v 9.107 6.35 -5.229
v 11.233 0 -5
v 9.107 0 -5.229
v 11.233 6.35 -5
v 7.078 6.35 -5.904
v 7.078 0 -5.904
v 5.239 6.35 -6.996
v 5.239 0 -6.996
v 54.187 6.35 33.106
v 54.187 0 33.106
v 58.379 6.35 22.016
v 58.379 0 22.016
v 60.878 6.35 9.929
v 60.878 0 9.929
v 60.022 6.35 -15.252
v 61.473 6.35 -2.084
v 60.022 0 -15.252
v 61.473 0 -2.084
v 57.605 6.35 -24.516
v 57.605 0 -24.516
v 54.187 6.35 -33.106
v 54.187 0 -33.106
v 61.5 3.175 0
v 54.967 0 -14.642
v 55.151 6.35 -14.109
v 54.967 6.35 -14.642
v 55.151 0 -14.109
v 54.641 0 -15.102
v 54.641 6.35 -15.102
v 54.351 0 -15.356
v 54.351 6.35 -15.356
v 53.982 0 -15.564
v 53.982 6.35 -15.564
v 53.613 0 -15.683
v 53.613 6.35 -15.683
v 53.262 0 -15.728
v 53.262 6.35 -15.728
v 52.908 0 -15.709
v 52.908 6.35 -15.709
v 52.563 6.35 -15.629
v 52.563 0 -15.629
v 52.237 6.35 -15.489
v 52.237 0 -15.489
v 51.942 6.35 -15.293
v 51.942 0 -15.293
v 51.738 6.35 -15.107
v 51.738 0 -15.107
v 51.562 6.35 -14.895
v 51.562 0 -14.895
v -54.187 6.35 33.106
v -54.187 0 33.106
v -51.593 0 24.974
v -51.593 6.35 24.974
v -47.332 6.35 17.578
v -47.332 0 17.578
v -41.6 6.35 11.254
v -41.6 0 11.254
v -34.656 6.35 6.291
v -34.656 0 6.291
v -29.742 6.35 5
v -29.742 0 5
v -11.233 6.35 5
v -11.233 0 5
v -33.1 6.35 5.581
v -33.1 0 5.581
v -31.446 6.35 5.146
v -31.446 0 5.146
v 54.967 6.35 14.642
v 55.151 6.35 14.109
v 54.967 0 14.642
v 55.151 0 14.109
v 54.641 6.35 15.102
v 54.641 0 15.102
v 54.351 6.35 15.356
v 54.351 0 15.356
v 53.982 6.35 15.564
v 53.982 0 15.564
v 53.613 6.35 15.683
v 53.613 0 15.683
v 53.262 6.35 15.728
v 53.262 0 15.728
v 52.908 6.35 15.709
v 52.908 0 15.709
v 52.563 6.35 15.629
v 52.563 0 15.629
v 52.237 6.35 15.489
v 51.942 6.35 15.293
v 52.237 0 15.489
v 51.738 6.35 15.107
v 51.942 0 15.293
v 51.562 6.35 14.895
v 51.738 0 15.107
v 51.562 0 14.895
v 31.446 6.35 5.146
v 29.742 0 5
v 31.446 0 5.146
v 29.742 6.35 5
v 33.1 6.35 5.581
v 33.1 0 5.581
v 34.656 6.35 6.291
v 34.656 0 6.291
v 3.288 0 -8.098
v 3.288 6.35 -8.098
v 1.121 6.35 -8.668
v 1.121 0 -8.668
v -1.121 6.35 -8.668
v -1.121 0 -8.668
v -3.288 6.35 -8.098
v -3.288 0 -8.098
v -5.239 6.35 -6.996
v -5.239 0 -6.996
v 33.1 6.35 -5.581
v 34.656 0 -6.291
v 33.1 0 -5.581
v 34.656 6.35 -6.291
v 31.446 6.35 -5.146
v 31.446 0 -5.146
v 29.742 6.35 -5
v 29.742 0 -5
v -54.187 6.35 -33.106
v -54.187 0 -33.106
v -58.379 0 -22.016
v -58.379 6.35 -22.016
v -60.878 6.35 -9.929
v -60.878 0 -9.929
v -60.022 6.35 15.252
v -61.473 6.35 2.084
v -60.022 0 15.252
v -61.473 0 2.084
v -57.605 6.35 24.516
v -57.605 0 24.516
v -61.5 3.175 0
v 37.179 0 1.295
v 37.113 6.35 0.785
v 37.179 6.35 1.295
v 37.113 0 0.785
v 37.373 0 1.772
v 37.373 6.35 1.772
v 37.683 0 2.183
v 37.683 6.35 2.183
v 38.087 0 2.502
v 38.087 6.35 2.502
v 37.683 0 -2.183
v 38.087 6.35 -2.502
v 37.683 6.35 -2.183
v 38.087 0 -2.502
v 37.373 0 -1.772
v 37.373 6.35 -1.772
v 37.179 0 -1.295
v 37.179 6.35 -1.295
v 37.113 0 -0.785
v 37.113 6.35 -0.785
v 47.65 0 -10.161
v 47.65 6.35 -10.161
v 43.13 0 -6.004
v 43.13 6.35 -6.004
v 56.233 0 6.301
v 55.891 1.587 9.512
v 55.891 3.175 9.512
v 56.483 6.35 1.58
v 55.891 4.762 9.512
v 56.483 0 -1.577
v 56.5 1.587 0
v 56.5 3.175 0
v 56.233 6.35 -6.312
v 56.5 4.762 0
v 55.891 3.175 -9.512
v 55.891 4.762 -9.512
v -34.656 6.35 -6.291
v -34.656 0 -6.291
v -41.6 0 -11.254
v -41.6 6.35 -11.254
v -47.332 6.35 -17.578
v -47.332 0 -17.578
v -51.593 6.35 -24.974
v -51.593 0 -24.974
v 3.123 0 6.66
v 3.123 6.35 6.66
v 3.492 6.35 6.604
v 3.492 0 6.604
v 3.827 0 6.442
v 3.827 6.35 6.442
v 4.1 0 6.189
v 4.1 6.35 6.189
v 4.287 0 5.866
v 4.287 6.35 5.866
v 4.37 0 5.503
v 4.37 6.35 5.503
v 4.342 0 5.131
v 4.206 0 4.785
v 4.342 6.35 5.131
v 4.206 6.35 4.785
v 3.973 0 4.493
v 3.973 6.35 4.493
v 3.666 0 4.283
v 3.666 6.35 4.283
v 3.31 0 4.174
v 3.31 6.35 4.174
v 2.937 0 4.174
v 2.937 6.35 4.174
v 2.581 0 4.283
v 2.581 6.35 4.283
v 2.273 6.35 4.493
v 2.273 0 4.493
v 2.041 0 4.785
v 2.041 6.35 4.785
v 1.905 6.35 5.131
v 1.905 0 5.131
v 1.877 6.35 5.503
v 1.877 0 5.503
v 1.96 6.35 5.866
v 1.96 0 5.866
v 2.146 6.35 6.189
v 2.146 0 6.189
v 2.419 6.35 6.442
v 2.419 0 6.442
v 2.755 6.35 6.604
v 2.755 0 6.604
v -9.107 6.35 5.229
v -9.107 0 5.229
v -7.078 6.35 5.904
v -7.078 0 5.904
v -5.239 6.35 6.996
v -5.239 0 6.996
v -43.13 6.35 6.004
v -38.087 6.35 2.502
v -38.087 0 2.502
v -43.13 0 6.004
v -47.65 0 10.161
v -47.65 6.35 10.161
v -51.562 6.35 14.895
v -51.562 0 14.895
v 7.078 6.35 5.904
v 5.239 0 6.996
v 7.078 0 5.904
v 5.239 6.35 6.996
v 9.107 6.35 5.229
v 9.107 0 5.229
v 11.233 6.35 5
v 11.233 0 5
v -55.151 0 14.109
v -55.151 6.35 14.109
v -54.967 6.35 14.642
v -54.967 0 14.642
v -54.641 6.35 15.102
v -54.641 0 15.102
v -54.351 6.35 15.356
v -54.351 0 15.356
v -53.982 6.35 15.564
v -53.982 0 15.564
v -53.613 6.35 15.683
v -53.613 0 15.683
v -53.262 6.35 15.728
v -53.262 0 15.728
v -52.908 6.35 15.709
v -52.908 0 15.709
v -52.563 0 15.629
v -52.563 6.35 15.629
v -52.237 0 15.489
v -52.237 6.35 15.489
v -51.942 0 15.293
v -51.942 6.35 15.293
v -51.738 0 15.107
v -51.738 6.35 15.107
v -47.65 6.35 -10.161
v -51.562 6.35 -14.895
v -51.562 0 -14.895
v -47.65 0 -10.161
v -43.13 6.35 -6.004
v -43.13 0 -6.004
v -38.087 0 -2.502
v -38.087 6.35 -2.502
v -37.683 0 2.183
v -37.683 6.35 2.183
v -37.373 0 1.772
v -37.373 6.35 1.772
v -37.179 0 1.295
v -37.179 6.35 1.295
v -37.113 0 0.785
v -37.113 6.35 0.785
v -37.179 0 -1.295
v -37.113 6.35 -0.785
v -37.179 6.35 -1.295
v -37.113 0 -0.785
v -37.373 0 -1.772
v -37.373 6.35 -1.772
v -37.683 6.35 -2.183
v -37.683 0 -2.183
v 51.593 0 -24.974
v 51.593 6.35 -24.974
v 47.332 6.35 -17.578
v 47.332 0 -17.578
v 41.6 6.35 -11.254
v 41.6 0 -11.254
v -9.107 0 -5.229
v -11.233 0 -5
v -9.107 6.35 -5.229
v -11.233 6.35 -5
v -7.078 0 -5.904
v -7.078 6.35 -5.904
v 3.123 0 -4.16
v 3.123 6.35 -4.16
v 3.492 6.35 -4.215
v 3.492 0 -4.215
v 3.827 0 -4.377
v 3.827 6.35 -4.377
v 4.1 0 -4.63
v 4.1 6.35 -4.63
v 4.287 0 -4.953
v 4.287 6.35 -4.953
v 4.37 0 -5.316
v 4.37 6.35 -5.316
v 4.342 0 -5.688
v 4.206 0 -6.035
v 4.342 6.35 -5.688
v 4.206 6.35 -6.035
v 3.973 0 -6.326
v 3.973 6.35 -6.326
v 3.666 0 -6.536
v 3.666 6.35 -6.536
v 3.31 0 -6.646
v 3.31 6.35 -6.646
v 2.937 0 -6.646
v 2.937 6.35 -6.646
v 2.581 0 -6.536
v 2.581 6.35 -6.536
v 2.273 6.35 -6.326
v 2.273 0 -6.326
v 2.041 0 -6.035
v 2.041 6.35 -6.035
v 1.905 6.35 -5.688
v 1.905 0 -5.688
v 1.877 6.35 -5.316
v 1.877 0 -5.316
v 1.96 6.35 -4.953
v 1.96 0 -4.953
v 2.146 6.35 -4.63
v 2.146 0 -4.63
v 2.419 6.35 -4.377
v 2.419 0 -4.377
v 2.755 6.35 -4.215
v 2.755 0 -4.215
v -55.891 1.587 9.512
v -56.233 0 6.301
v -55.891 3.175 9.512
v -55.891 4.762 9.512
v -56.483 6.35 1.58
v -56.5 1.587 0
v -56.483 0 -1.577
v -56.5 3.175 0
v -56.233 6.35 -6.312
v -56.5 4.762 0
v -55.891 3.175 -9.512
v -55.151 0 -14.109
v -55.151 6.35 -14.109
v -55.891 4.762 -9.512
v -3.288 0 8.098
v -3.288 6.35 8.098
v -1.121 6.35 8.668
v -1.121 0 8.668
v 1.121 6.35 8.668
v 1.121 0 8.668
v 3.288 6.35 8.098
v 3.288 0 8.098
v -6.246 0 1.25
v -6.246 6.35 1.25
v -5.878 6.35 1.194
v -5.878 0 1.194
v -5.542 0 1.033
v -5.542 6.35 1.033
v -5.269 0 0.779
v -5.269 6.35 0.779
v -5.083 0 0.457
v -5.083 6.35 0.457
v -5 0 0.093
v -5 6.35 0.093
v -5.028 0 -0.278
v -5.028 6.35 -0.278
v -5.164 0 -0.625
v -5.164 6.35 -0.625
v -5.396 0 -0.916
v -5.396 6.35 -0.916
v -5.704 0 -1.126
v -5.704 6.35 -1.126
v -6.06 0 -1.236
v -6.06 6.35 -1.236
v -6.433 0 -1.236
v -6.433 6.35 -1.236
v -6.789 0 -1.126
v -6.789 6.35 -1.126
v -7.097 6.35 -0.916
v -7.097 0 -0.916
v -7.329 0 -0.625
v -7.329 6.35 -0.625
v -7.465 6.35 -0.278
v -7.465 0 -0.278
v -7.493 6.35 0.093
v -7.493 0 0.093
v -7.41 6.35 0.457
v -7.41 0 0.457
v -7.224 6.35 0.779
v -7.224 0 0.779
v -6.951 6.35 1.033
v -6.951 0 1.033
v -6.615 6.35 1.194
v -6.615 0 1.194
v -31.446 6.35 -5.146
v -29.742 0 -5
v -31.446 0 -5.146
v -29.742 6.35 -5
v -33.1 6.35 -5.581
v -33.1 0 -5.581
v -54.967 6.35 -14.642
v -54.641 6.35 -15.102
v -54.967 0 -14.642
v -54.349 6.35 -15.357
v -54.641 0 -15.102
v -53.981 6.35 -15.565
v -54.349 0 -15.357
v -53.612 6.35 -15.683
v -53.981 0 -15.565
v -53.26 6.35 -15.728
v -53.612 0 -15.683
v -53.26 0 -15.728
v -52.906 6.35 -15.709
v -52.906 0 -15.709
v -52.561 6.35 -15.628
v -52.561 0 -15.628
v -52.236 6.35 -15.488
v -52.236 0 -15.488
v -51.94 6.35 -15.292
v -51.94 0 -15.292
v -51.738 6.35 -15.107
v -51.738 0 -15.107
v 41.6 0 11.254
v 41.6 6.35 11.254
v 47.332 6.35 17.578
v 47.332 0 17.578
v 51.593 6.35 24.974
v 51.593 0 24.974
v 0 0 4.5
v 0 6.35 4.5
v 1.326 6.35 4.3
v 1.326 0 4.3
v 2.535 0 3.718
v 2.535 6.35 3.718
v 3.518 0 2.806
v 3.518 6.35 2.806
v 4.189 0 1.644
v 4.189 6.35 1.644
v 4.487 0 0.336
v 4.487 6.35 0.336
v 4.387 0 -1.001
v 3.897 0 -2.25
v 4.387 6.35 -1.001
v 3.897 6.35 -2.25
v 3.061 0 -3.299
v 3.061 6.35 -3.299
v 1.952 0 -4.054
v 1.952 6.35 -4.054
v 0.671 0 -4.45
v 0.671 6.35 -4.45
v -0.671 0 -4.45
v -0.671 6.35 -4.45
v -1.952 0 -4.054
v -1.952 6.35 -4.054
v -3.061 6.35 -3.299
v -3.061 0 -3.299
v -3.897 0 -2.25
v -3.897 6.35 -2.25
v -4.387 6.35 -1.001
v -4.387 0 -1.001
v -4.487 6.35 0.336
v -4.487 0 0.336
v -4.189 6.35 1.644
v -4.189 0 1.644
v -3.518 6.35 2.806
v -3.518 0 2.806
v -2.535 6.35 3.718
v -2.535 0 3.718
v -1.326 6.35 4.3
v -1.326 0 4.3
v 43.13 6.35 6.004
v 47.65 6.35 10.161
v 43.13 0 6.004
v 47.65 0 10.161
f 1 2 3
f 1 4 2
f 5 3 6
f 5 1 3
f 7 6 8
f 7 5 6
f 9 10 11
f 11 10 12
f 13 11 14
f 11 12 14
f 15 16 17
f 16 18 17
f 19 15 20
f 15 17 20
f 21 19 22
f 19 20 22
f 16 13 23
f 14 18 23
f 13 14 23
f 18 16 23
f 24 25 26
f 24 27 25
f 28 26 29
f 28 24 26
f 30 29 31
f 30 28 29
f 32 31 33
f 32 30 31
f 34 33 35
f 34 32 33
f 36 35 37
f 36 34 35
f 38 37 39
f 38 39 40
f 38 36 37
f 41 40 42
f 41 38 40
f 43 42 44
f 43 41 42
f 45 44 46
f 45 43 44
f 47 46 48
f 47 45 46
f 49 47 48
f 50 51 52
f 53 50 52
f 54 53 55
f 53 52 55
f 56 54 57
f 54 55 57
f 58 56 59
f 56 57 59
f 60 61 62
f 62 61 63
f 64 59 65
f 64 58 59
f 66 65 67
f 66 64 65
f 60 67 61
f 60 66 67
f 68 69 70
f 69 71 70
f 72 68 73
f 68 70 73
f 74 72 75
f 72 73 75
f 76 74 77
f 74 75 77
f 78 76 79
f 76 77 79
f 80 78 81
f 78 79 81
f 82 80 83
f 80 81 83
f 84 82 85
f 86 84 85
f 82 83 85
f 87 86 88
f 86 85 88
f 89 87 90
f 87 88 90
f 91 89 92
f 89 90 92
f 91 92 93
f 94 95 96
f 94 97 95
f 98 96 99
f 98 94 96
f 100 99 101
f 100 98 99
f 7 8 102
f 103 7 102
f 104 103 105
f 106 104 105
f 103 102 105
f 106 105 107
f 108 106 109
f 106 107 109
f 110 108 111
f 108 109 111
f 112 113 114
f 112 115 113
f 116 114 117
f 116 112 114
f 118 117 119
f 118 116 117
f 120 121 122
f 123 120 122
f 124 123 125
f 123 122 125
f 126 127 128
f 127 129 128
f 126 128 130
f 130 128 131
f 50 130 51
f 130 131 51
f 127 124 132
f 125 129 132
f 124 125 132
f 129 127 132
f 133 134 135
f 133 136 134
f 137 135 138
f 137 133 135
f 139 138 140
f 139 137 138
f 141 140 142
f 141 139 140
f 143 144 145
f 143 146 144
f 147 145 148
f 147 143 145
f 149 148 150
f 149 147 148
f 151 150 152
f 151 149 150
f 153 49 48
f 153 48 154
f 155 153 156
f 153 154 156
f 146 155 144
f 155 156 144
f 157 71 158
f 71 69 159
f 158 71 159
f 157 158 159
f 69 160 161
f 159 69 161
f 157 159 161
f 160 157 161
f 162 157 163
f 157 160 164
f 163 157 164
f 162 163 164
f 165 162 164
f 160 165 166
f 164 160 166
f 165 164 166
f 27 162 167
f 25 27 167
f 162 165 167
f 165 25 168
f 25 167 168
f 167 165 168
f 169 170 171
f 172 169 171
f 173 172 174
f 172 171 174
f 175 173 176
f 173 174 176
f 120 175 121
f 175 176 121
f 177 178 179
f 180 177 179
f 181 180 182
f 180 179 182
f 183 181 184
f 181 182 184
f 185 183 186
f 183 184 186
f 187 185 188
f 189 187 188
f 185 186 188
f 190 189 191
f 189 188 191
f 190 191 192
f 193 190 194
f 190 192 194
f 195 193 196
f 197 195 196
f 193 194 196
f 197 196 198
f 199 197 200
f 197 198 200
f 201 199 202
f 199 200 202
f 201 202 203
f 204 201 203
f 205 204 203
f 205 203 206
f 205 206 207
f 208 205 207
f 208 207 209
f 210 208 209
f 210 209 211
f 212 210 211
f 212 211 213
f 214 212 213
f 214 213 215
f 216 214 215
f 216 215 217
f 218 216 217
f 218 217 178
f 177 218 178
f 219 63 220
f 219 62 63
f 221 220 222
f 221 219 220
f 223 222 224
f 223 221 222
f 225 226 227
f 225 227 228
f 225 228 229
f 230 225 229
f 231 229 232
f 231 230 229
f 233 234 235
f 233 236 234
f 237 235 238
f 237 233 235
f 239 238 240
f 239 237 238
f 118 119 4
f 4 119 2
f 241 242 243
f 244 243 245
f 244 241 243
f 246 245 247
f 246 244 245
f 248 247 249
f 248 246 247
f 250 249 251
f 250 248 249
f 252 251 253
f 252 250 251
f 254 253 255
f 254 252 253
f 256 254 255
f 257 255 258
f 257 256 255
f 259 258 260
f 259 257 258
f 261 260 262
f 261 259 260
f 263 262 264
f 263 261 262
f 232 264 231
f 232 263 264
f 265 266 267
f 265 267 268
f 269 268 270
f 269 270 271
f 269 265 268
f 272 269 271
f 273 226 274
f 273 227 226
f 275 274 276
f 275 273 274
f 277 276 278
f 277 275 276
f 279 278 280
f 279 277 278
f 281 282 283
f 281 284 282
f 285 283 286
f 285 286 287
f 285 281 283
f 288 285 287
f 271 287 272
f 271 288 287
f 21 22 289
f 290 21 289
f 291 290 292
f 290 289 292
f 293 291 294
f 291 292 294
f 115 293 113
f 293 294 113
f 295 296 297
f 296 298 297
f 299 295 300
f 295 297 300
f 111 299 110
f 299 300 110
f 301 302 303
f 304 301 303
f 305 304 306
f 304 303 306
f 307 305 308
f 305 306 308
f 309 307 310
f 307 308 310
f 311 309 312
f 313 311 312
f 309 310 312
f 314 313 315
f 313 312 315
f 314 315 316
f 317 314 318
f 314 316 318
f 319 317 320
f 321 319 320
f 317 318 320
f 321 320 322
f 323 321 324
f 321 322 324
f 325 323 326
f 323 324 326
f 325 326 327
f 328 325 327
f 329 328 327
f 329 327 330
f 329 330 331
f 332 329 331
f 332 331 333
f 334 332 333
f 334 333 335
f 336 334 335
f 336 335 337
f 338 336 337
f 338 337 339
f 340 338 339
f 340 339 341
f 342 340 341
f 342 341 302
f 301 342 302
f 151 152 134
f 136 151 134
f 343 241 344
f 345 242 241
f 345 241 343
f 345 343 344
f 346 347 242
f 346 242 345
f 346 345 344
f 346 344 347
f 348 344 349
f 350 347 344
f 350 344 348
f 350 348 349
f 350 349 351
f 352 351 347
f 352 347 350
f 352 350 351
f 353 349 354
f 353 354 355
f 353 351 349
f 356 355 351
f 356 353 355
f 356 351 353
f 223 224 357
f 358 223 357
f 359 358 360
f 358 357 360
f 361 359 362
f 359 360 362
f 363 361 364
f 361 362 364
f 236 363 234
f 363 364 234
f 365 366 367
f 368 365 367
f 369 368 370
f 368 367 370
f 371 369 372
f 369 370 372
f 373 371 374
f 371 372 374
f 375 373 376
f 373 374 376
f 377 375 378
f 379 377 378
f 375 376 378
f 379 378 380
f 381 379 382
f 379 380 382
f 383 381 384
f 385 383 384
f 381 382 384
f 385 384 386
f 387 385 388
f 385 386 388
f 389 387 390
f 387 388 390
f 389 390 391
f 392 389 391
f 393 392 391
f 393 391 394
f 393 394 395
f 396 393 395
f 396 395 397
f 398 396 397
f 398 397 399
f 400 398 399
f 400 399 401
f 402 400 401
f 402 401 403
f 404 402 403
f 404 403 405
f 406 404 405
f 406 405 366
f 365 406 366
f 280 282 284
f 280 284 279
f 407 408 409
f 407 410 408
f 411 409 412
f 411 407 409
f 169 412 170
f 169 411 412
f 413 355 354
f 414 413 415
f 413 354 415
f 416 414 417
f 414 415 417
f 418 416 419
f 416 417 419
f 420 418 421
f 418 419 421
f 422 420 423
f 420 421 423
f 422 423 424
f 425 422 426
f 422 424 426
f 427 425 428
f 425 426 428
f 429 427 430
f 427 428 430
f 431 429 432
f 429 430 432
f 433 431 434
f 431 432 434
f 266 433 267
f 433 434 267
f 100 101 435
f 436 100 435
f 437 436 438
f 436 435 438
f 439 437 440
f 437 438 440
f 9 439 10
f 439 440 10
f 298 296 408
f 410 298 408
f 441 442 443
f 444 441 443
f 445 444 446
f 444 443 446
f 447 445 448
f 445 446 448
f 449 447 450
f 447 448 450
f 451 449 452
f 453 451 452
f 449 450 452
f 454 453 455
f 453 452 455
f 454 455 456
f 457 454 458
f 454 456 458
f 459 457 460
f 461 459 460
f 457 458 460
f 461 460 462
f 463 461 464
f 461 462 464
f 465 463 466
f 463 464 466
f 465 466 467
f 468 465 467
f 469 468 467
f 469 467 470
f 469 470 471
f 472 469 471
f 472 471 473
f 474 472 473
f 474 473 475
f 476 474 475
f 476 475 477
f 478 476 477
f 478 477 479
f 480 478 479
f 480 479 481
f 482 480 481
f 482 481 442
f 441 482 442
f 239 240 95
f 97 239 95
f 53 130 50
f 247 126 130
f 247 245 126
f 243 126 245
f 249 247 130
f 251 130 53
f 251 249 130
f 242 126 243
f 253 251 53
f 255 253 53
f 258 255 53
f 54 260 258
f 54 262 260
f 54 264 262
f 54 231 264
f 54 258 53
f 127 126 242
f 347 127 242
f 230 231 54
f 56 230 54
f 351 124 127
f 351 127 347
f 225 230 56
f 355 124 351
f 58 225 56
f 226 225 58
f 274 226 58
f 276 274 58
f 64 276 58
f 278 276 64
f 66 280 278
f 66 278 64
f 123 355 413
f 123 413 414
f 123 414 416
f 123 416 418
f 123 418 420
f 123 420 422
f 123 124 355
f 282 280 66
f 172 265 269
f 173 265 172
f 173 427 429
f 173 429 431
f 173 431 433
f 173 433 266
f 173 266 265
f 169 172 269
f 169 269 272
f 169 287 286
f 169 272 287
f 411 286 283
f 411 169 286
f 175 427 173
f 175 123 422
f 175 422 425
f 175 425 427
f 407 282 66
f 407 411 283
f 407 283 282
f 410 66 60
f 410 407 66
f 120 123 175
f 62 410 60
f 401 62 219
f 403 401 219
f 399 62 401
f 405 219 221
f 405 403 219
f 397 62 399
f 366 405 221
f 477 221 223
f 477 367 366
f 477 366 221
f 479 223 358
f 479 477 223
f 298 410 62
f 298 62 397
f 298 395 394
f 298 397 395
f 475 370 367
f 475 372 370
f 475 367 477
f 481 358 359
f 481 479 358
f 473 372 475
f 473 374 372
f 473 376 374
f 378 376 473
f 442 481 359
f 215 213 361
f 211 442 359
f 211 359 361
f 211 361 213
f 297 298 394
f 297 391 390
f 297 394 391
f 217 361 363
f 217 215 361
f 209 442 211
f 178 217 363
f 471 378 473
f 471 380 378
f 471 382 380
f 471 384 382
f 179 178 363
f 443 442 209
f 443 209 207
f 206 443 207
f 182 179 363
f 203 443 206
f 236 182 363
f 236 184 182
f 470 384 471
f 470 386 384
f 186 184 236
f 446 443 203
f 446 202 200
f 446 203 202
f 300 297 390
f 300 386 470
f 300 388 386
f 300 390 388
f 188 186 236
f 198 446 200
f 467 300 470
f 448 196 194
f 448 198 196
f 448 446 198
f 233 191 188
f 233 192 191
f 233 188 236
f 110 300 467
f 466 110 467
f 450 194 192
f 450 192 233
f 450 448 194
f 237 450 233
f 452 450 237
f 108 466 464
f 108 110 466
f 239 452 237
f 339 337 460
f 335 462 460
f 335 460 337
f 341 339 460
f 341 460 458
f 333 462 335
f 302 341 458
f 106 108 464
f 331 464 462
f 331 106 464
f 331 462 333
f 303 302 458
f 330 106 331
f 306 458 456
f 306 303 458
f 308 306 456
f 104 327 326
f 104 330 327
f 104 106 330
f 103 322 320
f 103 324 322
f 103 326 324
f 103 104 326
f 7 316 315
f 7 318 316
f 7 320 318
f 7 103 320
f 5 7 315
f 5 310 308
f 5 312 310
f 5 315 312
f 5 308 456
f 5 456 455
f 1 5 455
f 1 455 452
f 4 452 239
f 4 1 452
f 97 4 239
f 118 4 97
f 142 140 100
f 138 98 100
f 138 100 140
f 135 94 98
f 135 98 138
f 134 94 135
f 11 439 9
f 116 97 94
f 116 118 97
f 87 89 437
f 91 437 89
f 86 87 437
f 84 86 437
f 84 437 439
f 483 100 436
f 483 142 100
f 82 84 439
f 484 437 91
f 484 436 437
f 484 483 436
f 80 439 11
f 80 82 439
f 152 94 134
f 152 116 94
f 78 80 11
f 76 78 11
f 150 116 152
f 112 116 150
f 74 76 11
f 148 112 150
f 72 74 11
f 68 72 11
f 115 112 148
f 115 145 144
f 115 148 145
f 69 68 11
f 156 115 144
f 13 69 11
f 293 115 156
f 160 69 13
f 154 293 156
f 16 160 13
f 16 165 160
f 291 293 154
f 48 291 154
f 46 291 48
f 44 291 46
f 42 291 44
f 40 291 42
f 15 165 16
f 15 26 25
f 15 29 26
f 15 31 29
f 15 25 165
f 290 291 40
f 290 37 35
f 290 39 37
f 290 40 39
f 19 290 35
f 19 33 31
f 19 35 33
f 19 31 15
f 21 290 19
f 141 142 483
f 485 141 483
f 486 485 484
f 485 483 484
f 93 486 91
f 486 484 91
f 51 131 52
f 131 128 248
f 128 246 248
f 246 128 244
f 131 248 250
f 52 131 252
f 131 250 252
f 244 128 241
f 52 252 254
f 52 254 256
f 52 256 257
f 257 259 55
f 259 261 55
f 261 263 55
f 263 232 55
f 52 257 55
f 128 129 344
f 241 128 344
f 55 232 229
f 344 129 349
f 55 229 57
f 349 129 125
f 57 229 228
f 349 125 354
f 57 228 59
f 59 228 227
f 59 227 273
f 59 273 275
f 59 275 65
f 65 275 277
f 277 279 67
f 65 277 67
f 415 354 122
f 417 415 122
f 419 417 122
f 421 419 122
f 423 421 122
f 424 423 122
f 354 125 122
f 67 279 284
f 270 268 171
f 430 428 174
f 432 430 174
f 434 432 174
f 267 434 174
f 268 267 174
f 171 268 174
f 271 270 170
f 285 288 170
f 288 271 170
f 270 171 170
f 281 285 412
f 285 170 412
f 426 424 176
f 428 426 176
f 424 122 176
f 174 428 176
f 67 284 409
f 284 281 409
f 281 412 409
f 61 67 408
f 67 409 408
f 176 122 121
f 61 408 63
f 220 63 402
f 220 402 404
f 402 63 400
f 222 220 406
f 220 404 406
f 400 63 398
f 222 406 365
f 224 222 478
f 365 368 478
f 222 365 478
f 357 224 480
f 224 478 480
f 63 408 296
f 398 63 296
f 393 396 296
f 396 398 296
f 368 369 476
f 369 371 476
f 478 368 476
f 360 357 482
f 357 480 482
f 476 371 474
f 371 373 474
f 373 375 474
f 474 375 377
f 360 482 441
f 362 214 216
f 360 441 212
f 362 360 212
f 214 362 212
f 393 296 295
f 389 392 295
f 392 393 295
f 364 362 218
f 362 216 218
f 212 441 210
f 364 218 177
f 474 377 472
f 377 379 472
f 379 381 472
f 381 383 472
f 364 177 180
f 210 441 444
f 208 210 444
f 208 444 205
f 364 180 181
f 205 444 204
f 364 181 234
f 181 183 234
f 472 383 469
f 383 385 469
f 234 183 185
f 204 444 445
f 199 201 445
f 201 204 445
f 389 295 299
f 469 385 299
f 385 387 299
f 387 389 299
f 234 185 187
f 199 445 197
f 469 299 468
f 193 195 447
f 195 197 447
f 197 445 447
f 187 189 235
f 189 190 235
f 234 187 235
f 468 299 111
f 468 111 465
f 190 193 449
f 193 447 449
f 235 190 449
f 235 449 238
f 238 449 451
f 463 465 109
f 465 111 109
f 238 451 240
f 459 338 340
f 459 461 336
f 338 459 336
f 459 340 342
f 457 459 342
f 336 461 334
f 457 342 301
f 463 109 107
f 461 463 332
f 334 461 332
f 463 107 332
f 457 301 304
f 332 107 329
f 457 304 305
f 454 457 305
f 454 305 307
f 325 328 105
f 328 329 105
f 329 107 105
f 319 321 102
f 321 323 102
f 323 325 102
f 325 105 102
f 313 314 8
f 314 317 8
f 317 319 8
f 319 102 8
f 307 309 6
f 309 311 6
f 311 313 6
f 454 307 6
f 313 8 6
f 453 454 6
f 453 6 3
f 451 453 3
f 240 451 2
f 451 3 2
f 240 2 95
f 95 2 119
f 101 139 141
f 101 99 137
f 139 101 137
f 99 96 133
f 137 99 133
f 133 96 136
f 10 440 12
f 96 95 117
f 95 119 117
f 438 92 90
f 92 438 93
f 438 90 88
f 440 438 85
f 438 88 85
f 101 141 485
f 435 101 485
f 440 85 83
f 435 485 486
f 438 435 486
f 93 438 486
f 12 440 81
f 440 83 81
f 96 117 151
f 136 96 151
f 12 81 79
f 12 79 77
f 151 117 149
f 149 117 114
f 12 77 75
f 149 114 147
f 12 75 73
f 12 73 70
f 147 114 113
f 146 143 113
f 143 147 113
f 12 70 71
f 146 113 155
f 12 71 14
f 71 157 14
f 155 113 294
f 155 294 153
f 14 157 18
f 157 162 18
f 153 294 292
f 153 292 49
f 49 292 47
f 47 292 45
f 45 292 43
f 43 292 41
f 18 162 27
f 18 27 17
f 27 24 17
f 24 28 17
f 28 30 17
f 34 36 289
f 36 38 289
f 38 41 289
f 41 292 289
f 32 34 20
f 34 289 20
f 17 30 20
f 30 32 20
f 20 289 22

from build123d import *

# Parameters (mm, degrees)
SKETCH1_R           = 8.74
BOSS_EXTRUDE2_DEPTH = 6.35
FILLET1_R           = 10
SKETCH2_R           = 4.5
CUT_EXTRUDE1_DEPTH  = 71.132527363
SKETCH3_R           = 1.25
CUT_EXTRUDE2_DEPTH  = 71.132527363
CUT_EXTRUDE5_DEPTH  = 71.132527363
FILLET2_R           = 2
FILLET3_R           = 2


with BuildPart() as part:
    # Sketch1 → Boss-Extrude2 (new body)
    with BuildSketch(Plane(origin=(0, 0, 0), x_dir=(1, 0, 0), z_dir=(0, 1, 0))):
        with BuildLine():
            ThreePointArc((-7.16851449, -5), (-8.74, 0), (-7.16851449, 5))
            Line((-7.16851449, 5), (-32.16851449, 5))
            ThreePointArc((-32.16851449, 5), (-46.487760751, 16.45991775), (-54.187285312, 33.10587371))
            add(Edge.make_bspline(
                [(-54.187285312, 33.10587371), (-69.799584501, 0), (-54.187285312, -33.10587371)],
                knots=[1.078170572, 1.078170572, 1.078170572, 2.063422082, 2.063422082, 2.063422082], degree=2, weights=[1, 0.88109407, 1]))
            ThreePointArc((-54.187285312, -33.10587371), (-46.487760751, -16.45991775), (-32.16851449, -5))
            Line((-32.16851449, -5), (-7.16851449, -5))
        make_face()
        Circle(SKETCH1_R)
        with BuildLine():
            Line((32.16851449, 5), (7.16851449, 5))
            ThreePointArc((7.16851449, 5), (8.337877927, 2.620570868), (8.74, 0))
            ThreePointArc((8.74, 0), (8.337877927, -2.620570868), (7.16851449, -5))
            Line((7.16851449, -5), (32.16851449, -5))
            ThreePointArc((32.16851449, -5), (46.487760751, -16.45991775), (54.187285312, -33.10587371))
            add(Edge.make_bspline(
                [(54.187285312, -33.10587371), (69.799584501, 0), (54.187285312, 33.10587371)],
                knots=[4.219763225, 4.219763225, 4.219763225, 5.205014735, 5.205014735, 5.205014735], degree=2, weights=[1, 0.88109407, 1]))
            ThreePointArc((54.187285312, 33.10587371), (46.487760751, 16.45991775), (32.16851449, 5))
        make_face()
    extrude(amount=BOSS_EXTRUDE2_DEPTH)

    # Fillet1
    fillet1_edges = [part.edges().sort_by_distance(p)[0] for p in [
        (-32.16851449, 3.175, -5),
        (-7.16851449, 3.175, -5),
        (7.16851449, 3.175, -5),
        (32.16851449, 3.175, -5),
        (32.16851449, 3.175, 5),
        (7.16851449, 3.175, 5),
        (-7.16851449, 3.175, 5),
        (-32.16851449, 3.175, 5),
    ]]
    fillet(fillet1_edges, radius=FILLET1_R)

    # Sketch2 → Cut-Extrude1 (cut, through all)
    with BuildSketch(Plane(origin=(0, 6.35, 0), x_dir=(1, 0, 0), z_dir=(0, 1, 0))):
        with Locations(Location((0, 0, 0), (0, 0, 270))):
            Circle(SKETCH2_R)
    extrude(amount=-CUT_EXTRUDE1_DEPTH, mode=Mode.SUBTRACT)

    # Sketch3 → Cut-Extrude2 (cut, through all)
    with BuildSketch(Plane(origin=(0, 6.35, 0), x_dir=(1, 0, 0), z_dir=(0, 1, 0))):
        with Locations(Location((-6.2464, 0, 0), (0, 0, 270))):
            Circle(SKETCH3_R)
        with Locations(Location((3.1232, 5.409541082, 0), (0, 0, 270))):
            Circle(SKETCH3_R)
        with Locations(Location((3.1232, -5.409541082, 0), (0, 0, 270))):
            Circle(SKETCH3_R)
    extrude(amount=-CUT_EXTRUDE2_DEPTH, mode=Mode.SUBTRACT)

    # Sketch4 → Cut-Extrude5 (cut, through all)
    with BuildSketch(Plane(origin=(0, 6.35, 0), x_dir=(1, 0, 0), z_dir=(0, 1, 0))):
        with BuildLine():
            add(Edge.make_bspline(
                [(-54.07815408, -18.814509315), (-54.878953653, -15.771750191), (-55.485617126, -12.659616872), (-56.296145207, -6.364958437), (-56.5, -3.182494687), (-56.5, 3.182494687), (-56.296145207, 6.364958437), (-55.485617126, 12.659616872), (-54.878953653, 15.771750191), (-54.07815408, 18.814509315)],
                knots=[0, 0, 0, 0, 0.25, 0.25, 0.5, 0.5, 0.75, 0.75, 1, 1, 1, 1], degree=3))
            ThreePointArc((-54.07815408, 18.814509315), (-46.738015221, 9.226749217), (-37.112695661, 1.935932696))
            Line((-37.112695661, 1.935932696), (-37.112695661, -1.935932696))
            ThreePointArc((-37.112695661, -1.935932696), (-46.738015221, -9.226749217), (-54.07815408, -18.814509315))
        make_face()
        with BuildLine():
            ThreePointArc((37.112695661, -1.935932696), (46.738015221, -9.226749217), (54.07815408, -18.814509315))
            add(Edge.make_bspline(
                [(54.07815408, -18.814509315), (54.878953653, -15.771750191), (55.485617126, -12.659616872), (56.296145207, -6.364958437), (56.5, -3.182494687), (56.5, 3.182494687), (56.296145207, 6.364958437), (55.485617126, 12.659616872), (54.878953653, 15.771750191), (54.07815408, 18.814509315)],
                knots=[0, 0, 0, 0, 0.25, 0.25, 0.5, 0.5, 0.75, 0.75, 1, 1, 1, 1], degree=3))
            ThreePointArc((54.07815408, 18.814509315), (46.738015221, 9.226749217), (37.112695661, 1.935932696))
            Line((37.112695661, 1.935932696), (37.112695661, -1.935932696))
        make_face()
    extrude(amount=-CUT_EXTRUDE5_DEPTH, mode=Mode.SUBTRACT)

    # Fillet2
    fillet2_edges = [part.edges().sort_by_distance(p)[0] for p in [
        (-37.112695661, 3.175, 1.935932696),
        (-37.112695661, 3.175, -1.935932696),
        (-54.07815408, 3.175, 18.814509315),
        (-54.07815408, 3.175, -18.814509315),
    ]]
    fillet(fillet2_edges, radius=FILLET2_R)

    # Fillet3
    fillet3_edges = [part.edges().sort_by_distance(p)[0] for p in [
        (54.07815408, 3.175, 18.814509315),
        (54.07815408, 3.175, -18.814509315),
        (37.112695661, 3.175, -1.935932696),
        (37.112695661, 3.175, 1.935932696),
    ]]
    fillet(fillet3_edges, radius=FILLET3_R)


solid = part.part
